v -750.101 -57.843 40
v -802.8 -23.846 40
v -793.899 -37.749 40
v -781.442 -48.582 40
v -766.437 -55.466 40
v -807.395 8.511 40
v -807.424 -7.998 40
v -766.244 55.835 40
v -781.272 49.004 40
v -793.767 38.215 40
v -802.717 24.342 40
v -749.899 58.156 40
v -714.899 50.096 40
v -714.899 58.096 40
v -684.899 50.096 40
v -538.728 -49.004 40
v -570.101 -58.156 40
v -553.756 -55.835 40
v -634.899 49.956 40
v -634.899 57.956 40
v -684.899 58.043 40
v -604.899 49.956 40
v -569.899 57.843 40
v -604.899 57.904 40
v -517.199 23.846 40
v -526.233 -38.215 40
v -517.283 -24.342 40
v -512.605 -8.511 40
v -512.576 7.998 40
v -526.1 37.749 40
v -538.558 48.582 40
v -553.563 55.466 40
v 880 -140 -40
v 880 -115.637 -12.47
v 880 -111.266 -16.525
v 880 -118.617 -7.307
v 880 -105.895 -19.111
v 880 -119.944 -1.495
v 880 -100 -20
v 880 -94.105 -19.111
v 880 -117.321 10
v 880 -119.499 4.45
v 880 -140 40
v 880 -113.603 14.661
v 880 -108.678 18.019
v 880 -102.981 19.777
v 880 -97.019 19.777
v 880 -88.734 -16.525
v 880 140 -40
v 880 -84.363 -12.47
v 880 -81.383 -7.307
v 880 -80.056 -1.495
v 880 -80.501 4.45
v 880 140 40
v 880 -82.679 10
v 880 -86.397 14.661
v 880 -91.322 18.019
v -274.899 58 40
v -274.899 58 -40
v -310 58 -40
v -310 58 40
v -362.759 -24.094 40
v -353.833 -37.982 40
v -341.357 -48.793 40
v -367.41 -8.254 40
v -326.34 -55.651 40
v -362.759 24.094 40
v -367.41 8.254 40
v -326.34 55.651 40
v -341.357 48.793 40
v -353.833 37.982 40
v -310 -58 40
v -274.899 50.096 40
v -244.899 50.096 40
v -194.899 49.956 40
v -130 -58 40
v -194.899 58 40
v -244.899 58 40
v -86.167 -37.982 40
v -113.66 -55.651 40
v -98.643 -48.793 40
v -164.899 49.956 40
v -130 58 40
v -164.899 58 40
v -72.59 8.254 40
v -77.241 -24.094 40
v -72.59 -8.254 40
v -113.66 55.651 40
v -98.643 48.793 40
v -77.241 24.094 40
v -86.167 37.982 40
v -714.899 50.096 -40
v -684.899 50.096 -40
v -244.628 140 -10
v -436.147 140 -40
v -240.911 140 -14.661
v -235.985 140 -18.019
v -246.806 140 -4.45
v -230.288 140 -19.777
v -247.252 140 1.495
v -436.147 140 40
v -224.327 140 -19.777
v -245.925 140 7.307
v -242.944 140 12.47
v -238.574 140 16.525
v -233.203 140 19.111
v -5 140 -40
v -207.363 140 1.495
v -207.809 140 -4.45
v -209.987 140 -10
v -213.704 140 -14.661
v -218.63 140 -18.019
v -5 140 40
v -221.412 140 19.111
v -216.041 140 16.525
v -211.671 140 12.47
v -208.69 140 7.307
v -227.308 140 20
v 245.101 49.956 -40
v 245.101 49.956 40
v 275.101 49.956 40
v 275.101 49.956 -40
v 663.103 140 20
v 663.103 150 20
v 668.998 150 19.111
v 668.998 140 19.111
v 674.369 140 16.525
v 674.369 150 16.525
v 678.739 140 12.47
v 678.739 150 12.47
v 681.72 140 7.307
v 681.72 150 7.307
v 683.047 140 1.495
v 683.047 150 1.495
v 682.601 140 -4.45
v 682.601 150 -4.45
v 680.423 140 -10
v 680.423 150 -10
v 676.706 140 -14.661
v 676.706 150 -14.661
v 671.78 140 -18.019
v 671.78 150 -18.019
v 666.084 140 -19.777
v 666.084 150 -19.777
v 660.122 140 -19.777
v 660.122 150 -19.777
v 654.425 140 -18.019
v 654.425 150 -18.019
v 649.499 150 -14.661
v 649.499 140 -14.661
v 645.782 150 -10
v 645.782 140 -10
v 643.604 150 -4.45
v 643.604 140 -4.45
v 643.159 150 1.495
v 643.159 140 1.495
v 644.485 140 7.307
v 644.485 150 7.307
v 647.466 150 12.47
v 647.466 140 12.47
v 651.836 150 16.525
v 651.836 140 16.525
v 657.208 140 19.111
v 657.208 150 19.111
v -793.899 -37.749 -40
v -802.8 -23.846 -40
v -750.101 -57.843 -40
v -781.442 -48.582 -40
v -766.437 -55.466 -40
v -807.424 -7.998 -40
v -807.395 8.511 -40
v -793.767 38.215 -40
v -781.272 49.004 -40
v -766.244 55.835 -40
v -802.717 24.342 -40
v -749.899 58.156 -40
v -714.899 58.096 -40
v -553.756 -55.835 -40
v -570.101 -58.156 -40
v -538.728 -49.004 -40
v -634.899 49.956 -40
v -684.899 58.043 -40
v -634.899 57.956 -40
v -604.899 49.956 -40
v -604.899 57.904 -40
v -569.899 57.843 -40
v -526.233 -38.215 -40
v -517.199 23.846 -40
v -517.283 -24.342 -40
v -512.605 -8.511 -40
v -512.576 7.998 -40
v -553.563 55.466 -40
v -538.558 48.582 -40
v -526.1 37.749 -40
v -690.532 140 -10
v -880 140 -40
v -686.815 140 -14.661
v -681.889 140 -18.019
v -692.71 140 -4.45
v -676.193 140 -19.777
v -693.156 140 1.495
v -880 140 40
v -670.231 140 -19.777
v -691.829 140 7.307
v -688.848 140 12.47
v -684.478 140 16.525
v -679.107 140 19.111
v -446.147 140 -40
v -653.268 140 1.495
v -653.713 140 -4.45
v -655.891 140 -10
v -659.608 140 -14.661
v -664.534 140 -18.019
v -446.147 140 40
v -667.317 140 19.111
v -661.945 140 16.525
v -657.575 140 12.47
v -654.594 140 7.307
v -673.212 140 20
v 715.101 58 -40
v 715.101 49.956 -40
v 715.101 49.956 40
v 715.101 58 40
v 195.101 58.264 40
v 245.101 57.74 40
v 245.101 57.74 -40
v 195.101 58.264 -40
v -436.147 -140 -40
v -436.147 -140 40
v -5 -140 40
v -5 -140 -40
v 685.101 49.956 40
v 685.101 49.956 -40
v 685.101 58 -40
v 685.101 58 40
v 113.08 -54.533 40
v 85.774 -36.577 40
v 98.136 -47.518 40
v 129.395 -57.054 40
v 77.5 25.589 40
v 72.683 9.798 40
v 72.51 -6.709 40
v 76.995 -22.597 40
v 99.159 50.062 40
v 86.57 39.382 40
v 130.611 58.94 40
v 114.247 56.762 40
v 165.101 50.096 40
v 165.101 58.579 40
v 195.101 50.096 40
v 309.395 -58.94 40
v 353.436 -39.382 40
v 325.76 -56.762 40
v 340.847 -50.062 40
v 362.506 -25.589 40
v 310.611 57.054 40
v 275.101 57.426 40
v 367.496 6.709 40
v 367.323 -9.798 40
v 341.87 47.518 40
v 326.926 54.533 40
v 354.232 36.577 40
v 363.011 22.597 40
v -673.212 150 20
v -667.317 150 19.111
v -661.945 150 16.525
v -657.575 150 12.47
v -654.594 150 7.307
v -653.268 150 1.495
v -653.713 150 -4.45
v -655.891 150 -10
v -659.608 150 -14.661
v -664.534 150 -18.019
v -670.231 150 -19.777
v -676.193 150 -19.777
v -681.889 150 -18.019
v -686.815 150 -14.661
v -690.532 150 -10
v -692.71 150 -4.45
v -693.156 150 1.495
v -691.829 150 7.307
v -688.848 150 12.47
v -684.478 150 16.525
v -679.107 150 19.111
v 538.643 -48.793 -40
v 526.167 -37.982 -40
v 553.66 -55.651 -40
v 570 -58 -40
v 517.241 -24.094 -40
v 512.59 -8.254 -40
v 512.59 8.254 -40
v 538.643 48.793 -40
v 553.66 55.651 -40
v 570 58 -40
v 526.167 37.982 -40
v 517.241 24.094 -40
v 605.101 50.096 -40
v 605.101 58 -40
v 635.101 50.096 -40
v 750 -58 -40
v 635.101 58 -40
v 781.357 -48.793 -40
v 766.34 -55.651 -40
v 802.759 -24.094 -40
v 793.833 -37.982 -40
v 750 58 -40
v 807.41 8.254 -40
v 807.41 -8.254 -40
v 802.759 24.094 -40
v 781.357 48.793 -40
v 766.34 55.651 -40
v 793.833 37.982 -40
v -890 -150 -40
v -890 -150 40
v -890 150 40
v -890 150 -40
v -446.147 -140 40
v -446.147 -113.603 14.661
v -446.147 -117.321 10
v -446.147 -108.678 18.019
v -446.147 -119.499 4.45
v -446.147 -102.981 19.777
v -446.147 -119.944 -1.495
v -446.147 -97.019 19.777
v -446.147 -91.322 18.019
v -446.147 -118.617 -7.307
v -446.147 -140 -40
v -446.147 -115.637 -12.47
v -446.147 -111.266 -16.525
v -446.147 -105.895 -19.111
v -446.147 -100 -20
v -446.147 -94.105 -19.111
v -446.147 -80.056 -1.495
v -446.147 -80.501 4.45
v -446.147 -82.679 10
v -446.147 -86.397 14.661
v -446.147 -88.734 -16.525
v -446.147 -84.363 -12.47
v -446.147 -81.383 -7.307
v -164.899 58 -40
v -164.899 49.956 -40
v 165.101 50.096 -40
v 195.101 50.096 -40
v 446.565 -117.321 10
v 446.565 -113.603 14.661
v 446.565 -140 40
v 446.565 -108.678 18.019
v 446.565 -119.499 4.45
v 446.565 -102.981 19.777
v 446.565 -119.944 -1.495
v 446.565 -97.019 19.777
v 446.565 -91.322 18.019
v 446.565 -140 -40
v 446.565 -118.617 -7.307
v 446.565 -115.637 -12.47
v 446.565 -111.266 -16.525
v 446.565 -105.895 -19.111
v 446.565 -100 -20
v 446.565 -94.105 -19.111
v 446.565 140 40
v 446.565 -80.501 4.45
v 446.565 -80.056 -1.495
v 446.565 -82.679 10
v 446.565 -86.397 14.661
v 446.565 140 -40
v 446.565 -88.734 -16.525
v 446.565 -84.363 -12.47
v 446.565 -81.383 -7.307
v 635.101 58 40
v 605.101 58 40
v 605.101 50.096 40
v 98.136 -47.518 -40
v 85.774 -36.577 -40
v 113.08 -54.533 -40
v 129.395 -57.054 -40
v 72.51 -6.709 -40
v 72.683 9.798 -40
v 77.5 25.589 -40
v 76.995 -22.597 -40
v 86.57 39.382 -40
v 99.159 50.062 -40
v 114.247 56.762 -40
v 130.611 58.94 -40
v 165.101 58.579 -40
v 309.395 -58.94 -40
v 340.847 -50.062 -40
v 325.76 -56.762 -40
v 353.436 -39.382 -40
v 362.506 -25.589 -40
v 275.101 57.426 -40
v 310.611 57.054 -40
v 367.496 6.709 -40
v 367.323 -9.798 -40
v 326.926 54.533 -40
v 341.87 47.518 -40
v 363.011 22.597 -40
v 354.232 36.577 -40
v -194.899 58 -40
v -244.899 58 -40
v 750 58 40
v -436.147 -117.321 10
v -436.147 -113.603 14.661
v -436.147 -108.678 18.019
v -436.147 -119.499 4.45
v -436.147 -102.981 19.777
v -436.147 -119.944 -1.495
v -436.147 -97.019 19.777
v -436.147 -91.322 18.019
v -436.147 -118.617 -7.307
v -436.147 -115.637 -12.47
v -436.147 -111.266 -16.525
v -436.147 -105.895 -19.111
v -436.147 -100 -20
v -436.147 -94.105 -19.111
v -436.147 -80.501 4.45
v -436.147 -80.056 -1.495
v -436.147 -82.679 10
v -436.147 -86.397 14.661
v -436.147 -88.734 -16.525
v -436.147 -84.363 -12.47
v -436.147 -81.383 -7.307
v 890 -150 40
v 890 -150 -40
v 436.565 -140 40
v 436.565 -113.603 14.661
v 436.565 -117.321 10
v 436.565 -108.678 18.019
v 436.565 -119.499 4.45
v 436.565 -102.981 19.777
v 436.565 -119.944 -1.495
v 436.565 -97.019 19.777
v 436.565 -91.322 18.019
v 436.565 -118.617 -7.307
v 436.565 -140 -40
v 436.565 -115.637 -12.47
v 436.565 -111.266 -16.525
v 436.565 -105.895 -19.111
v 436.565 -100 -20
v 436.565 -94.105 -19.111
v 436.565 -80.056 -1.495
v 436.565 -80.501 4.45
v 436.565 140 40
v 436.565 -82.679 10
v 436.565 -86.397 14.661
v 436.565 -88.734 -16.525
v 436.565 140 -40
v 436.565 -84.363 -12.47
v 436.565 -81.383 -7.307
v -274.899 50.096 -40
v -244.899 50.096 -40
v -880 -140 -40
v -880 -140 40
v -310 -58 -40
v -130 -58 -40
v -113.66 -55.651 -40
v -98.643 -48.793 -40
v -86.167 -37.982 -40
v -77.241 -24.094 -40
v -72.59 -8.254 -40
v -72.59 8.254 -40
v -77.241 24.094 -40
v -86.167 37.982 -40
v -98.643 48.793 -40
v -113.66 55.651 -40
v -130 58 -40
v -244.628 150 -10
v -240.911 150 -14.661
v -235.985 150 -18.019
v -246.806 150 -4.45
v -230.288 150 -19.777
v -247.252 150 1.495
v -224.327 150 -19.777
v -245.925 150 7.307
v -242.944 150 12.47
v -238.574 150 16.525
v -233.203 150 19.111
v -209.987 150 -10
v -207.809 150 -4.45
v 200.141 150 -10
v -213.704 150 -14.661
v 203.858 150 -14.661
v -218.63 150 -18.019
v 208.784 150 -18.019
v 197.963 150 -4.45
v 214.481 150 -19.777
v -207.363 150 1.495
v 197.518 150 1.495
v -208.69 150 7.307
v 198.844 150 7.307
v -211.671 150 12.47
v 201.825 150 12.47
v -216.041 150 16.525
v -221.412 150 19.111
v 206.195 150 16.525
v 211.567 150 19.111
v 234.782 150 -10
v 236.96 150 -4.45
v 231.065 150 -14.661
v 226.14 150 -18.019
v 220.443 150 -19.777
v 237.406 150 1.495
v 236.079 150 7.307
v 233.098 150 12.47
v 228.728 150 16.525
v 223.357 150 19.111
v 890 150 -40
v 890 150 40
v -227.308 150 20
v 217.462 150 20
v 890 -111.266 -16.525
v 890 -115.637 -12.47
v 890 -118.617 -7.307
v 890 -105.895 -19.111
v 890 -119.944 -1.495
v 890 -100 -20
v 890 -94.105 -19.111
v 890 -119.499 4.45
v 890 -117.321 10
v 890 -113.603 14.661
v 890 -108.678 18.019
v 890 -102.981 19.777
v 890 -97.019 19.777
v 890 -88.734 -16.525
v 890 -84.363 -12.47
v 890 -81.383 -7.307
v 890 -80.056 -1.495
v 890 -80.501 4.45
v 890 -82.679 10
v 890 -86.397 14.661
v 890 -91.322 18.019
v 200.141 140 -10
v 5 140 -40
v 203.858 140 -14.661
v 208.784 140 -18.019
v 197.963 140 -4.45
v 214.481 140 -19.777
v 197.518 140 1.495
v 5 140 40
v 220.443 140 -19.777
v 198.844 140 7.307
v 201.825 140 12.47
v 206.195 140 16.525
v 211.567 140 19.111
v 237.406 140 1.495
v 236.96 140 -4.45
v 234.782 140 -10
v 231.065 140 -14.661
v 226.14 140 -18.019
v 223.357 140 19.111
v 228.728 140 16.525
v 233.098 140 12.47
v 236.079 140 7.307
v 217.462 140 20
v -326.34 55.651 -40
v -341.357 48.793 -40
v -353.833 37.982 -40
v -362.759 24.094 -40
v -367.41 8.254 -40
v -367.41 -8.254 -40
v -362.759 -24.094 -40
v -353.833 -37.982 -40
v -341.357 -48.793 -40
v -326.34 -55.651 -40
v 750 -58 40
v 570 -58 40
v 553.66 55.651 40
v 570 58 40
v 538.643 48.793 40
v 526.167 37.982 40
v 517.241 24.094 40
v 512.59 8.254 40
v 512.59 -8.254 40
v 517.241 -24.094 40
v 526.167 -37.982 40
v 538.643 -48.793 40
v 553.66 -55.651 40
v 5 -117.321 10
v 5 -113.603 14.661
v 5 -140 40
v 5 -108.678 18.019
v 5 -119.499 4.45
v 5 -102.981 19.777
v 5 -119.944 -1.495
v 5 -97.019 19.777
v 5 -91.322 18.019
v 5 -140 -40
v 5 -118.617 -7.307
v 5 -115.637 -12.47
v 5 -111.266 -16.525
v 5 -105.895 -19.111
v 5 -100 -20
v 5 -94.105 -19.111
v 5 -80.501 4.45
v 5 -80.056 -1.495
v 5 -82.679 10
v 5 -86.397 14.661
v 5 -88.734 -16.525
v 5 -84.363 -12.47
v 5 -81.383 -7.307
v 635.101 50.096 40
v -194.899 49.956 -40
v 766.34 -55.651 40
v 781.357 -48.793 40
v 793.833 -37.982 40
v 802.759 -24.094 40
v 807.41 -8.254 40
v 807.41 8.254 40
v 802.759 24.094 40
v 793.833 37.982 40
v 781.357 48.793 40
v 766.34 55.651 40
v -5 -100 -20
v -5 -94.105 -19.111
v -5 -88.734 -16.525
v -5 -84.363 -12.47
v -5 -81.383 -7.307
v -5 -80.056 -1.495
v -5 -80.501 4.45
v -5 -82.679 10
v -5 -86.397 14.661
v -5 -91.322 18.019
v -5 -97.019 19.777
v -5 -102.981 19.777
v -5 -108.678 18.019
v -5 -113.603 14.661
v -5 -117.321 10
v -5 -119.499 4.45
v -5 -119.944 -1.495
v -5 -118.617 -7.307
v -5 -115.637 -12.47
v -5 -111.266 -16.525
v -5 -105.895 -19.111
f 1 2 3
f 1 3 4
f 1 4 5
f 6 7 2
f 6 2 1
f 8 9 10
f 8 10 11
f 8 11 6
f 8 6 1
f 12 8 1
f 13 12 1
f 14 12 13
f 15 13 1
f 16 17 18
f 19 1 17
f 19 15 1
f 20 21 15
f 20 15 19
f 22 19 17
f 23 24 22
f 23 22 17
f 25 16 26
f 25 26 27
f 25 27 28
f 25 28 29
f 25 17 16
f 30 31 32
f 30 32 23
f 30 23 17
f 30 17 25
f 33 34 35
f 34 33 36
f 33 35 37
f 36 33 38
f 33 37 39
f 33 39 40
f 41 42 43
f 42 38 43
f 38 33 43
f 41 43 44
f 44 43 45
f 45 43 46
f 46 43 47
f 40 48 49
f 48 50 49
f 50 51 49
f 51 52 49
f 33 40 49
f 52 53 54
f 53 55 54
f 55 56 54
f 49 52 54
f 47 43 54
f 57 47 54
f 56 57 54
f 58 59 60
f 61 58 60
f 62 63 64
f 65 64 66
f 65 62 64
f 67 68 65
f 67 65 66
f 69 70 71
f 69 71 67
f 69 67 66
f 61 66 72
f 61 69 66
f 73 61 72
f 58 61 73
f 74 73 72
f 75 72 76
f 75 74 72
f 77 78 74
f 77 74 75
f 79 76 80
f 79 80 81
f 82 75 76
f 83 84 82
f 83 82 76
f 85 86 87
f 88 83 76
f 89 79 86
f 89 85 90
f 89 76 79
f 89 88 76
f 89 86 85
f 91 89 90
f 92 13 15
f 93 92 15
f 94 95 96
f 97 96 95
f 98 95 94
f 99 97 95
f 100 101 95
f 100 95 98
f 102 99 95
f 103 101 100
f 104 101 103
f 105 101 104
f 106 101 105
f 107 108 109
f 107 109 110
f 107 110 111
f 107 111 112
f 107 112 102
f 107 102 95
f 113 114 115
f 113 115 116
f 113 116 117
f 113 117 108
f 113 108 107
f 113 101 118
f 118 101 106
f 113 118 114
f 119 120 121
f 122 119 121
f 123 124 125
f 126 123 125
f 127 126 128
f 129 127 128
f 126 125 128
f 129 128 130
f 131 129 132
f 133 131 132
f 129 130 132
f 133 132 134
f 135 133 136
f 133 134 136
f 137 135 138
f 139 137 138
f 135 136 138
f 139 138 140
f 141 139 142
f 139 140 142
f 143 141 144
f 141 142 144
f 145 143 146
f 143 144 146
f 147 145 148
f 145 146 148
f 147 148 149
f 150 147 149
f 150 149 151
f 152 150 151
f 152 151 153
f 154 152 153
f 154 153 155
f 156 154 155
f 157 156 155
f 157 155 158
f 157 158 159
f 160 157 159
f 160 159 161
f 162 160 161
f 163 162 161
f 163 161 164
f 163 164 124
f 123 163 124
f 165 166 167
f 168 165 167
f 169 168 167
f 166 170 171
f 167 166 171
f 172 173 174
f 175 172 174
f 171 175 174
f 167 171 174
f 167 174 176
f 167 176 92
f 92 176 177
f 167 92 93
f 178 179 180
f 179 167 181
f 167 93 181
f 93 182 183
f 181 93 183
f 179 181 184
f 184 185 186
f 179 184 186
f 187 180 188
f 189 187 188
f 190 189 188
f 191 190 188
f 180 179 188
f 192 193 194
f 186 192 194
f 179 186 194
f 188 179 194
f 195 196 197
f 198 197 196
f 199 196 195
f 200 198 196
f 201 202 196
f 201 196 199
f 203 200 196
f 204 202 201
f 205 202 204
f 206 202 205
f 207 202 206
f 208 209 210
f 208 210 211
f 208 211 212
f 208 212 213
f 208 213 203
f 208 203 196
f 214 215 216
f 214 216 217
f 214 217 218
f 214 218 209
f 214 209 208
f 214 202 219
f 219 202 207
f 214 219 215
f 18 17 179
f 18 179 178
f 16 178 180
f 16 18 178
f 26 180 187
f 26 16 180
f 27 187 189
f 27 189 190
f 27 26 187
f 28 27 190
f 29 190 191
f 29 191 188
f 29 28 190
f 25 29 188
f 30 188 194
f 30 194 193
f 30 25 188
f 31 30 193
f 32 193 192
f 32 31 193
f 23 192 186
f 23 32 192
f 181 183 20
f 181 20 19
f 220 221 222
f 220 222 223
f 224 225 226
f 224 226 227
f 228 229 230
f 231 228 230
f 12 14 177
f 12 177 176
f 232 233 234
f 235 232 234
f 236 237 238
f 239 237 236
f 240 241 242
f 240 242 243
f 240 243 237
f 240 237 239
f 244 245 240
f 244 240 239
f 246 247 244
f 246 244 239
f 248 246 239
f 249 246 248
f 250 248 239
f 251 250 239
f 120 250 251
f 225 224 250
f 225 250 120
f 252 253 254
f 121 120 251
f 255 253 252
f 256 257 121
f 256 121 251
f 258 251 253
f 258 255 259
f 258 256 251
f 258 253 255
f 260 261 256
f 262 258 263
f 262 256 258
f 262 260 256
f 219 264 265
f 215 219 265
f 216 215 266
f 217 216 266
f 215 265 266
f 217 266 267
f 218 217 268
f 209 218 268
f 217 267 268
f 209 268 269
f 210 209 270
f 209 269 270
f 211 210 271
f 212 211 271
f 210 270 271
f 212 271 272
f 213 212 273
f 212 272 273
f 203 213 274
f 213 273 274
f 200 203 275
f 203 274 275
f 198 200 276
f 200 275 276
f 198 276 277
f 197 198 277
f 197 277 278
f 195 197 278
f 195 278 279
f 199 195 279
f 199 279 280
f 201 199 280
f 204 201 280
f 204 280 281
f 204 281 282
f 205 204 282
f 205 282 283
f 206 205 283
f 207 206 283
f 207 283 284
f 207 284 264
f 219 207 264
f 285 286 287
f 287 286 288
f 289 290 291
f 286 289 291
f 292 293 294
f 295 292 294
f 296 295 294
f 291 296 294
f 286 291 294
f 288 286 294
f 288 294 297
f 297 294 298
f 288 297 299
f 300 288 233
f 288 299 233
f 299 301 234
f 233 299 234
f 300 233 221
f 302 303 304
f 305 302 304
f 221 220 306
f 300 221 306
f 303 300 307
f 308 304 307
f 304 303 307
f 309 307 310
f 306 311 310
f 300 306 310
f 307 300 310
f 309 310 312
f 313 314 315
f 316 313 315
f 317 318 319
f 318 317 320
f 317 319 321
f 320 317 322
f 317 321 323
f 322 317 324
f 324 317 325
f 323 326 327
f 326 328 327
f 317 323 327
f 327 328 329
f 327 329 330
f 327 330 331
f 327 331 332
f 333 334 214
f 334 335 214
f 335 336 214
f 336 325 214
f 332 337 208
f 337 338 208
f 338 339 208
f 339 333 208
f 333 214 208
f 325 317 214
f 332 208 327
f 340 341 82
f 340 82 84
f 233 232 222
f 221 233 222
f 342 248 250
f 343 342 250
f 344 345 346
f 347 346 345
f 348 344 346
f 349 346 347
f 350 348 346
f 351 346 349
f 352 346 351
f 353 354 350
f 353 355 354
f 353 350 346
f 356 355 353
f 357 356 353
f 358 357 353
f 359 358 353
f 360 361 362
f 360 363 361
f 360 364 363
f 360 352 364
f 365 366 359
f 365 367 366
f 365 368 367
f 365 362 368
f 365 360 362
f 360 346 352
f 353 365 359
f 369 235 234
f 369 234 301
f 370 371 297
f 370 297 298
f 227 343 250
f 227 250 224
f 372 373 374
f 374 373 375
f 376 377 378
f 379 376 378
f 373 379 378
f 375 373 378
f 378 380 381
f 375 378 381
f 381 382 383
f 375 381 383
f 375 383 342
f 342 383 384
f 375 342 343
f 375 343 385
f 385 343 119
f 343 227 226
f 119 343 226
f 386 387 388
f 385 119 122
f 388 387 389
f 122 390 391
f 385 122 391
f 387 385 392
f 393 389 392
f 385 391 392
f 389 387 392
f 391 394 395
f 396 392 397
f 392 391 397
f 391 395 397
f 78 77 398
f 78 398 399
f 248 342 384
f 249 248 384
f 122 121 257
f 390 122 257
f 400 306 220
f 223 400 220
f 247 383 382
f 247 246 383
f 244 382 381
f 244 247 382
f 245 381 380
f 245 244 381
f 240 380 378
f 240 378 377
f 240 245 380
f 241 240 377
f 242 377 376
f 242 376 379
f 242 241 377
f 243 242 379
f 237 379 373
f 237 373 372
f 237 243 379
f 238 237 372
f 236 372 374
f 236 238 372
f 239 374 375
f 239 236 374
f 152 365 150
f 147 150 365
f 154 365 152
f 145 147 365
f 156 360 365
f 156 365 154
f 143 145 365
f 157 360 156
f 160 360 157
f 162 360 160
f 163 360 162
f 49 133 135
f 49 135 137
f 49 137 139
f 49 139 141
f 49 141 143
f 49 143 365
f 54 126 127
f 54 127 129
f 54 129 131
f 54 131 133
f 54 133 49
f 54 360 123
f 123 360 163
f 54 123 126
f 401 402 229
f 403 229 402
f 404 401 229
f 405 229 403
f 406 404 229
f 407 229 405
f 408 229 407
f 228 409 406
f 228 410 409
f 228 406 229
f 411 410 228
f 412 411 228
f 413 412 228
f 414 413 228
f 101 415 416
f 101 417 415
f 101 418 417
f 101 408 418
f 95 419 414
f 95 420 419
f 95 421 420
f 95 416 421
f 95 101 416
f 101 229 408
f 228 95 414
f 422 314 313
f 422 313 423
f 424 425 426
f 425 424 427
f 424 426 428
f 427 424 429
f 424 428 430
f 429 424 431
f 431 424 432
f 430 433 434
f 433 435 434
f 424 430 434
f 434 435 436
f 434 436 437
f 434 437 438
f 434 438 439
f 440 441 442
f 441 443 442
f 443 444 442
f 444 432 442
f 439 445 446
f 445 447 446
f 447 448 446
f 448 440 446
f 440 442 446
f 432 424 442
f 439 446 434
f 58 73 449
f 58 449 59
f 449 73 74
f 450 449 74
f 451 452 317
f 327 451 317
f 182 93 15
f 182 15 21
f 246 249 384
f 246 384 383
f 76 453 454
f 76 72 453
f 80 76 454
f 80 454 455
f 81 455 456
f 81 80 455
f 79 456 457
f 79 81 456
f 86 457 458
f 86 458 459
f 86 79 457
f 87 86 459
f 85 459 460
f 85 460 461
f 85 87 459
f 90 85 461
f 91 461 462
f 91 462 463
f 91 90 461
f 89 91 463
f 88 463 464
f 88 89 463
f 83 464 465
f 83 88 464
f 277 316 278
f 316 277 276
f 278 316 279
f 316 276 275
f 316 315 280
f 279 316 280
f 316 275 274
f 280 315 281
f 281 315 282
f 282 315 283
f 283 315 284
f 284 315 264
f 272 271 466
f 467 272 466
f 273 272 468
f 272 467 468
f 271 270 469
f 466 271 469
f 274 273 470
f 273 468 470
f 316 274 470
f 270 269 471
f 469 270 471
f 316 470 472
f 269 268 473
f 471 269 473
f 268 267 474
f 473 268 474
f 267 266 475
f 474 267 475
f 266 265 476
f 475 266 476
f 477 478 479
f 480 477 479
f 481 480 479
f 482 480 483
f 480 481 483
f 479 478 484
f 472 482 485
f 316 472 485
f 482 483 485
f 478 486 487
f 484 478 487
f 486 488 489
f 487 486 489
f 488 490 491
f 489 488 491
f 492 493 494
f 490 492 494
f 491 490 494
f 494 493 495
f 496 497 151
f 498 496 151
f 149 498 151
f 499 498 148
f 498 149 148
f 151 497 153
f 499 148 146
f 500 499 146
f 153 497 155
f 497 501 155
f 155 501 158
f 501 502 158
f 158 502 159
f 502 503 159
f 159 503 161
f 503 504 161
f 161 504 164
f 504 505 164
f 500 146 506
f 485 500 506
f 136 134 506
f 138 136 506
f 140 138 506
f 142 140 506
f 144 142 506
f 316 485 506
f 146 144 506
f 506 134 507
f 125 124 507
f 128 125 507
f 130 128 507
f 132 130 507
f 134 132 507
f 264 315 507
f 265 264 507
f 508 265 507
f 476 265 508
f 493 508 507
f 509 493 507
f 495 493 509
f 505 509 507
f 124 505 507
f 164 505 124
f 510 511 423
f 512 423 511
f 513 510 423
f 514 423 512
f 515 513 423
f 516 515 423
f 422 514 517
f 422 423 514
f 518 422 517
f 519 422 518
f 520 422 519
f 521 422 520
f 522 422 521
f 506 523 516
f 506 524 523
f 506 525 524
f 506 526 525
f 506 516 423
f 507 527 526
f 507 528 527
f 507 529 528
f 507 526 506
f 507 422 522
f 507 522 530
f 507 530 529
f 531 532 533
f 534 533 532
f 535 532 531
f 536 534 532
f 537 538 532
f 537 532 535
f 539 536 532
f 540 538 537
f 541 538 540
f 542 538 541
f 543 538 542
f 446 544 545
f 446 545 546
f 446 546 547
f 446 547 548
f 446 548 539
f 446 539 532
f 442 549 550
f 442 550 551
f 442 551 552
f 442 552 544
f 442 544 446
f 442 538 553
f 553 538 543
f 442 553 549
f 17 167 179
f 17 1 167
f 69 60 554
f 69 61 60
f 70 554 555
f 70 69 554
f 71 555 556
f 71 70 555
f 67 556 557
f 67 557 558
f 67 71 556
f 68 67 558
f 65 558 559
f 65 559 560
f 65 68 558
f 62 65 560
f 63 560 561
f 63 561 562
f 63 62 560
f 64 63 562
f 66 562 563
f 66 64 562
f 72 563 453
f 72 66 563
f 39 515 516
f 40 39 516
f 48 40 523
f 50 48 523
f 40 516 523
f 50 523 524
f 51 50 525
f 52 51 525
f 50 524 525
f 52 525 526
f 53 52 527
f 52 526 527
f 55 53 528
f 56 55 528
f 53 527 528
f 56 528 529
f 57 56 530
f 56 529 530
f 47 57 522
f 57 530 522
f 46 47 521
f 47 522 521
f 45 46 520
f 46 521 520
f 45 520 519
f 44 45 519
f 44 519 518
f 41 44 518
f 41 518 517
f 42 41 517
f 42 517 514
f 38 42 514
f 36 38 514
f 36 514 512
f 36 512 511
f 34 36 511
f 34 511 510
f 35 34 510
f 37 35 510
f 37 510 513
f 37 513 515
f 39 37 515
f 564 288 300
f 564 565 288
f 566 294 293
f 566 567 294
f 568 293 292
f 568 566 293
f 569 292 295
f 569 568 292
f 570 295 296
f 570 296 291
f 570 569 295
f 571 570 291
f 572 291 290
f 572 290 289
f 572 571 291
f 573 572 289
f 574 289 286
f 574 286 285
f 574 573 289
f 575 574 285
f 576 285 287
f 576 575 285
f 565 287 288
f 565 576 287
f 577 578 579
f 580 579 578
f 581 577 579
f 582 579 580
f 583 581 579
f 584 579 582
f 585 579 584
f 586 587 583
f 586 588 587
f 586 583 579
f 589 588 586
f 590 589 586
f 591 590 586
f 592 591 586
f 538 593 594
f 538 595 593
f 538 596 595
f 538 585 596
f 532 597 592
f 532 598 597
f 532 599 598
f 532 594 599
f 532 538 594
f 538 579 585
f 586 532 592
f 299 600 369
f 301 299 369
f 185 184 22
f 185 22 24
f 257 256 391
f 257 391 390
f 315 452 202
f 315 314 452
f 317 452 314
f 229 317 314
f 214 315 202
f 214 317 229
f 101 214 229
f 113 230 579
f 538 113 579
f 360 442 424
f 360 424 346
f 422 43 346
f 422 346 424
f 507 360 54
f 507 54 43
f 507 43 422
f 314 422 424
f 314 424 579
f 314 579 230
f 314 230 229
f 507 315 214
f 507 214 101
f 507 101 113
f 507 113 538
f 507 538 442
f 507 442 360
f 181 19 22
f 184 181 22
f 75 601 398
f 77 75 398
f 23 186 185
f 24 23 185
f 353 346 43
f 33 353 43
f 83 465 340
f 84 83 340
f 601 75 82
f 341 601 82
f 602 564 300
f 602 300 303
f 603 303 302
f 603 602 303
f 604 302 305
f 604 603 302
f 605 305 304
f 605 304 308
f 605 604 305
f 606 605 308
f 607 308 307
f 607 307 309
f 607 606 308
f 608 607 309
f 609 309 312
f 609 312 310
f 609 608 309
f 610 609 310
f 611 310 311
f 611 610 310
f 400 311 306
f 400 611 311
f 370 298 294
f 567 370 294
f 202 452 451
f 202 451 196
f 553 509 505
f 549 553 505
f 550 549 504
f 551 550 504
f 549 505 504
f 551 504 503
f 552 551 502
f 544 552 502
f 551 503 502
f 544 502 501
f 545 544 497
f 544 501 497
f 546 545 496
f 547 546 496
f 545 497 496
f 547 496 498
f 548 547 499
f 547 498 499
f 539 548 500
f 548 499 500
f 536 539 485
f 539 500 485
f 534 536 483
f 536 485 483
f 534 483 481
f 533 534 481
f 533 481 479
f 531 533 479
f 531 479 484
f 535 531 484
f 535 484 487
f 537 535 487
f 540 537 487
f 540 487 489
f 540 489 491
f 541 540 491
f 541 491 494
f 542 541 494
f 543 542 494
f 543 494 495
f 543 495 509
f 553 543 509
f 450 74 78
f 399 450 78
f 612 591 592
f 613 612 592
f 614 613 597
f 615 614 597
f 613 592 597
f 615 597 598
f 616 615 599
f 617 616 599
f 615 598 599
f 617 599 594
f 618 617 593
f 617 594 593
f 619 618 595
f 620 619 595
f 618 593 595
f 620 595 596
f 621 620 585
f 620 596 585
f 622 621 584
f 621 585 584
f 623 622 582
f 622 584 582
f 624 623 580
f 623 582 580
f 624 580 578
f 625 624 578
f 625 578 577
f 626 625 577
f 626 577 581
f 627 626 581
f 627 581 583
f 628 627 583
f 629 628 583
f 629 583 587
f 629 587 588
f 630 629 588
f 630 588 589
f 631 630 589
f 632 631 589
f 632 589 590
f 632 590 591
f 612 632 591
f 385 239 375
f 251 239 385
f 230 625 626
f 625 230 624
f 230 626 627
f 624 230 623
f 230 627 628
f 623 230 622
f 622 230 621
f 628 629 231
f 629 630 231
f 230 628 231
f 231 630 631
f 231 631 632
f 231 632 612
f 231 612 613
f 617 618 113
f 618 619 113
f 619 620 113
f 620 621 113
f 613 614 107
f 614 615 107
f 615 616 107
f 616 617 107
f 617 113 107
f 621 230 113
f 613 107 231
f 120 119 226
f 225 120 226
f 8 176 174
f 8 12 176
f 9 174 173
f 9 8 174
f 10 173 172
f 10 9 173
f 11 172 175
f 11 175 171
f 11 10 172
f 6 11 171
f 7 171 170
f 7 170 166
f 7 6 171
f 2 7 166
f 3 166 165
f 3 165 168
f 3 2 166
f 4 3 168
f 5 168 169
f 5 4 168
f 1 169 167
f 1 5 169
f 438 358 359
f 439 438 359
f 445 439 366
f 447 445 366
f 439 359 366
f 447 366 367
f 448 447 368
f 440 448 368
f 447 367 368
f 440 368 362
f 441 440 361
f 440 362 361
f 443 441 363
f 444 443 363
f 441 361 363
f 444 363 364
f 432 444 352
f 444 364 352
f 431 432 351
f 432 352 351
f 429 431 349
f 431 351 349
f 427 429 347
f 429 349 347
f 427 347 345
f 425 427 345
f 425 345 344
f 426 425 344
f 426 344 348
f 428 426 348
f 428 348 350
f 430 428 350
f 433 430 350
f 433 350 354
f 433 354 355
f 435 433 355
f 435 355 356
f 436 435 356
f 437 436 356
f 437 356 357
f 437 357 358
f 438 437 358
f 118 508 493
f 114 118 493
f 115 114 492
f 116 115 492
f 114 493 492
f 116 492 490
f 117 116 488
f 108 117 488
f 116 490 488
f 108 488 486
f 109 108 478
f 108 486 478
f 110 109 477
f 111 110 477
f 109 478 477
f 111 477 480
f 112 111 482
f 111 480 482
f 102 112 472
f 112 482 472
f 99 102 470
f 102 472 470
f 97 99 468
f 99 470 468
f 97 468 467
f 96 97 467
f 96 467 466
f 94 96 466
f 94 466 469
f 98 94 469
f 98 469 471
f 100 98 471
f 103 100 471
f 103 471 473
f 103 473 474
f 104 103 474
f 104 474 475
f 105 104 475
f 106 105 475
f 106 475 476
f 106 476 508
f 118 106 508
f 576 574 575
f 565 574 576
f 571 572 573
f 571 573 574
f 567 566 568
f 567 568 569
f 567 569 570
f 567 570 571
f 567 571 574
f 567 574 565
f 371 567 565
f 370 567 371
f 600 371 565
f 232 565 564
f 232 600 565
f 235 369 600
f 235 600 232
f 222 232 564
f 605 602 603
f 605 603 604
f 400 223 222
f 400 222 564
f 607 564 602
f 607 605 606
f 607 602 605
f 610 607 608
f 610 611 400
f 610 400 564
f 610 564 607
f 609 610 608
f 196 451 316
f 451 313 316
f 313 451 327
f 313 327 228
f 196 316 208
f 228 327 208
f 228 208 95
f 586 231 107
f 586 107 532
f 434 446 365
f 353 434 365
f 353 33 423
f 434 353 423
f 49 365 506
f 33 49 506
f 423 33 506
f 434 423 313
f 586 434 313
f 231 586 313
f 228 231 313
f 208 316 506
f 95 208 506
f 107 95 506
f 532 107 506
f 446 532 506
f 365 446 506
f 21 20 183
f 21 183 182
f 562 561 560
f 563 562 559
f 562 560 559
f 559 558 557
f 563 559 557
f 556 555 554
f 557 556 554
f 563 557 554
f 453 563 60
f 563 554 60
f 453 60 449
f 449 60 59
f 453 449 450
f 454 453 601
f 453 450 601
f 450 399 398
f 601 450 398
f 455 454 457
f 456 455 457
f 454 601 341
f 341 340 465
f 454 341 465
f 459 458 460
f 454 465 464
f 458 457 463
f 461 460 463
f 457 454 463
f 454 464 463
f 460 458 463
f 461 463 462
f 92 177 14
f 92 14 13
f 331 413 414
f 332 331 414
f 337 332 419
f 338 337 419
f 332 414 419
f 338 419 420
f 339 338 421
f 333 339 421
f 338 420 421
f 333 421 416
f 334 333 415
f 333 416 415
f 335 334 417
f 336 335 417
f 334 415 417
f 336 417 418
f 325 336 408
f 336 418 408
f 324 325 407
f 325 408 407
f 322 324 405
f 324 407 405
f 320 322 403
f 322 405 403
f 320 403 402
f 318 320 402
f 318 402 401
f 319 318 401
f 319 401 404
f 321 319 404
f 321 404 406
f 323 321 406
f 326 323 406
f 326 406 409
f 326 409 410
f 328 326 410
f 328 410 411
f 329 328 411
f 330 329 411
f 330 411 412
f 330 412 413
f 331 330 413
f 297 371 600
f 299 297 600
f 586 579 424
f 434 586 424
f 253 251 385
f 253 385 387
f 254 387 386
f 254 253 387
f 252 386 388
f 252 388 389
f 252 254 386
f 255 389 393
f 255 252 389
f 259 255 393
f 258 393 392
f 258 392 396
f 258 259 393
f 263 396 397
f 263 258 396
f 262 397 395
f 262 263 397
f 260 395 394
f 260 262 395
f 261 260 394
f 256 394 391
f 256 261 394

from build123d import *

# Parameters (mm, degrees)
SKETCH1_W               = 1780
SKETCH1_H               = 300
SKETCH1_W_2             = 1760
SKETCH1_H_2             = 280
BOSS_EXTRUDE1_DEPTH     = 40
BOSS_EXTRUDE1_2_DEPTH   = 40
BOSS_EXTRUDE1_3_DEPTH   = 40
BOSS_EXTRUDE1_4_DEPTH   = 40
BOSS_EXTRUDE1_5_DEPTH   = 40
CUT_EXTRUDE1_DEPTH      = 907.090503206
CUT_EXTRUDE1_DEPTH_BACK = 907.090503206
SKETCH2_W               = 30
SKETCH2_H               = 9.489507293
SKETCH2_H_2             = 11.073503662
EXTRUDE_THIN1_START     = -10
SKETCH3_W               = 10
SKETCH3_H               = 80
EXTRUDE_THIN1_DEPTH     = 280
SKETCH4_R               = 20
CUT_EXTRUDE2_DEPTH      = 47
SKETCH6_R               = 20
CUT_EXTRUDE4_DEPTH      = 1437


with BuildPart() as part:
    # Sketch1 → Boss-Extrude1 (new, symmetric)
    with BuildSketch(Plane.XY):
        Rectangle(SKETCH1_W, SKETCH1_H)
        Rectangle(SKETCH1_W_2, SKETCH1_H_2, mode=Mode.SUBTRACT)
    extrude(amount=BOSS_EXTRUDE1_DEPTH, both=True)

    # Sketch3 → Extrude-Thin1 (add)
    with BuildSketch(Plane(origin=(0, 150, 0), x_dir=(1, 0, 0), z_dir=(0, 1, 0)).offset(EXTRUDE_THIN1_START)):
        with Locations((-441.146590851, 0)):
            Rectangle(SKETCH3_W, SKETCH3_H)
        Rectangle(SKETCH3_W, SKETCH3_H)
        with Locations((441.565331283, 0)):
            Rectangle(SKETCH3_W, SKETCH3_H)
    extrude(amount=-EXTRUDE_THIN1_DEPTH)

    # Sketch4 → Cut-Extrude2 (cut)
    with BuildSketch(Plane(origin=(0, 150, 0), x_dir=(1, 0, 0), z_dir=(0, 1, 0))):
        with Locations(Location((663.102774446, 0, 0), (0, 0, 270))):
            Circle(SKETCH4_R)
        with Locations(Location((217.461848741, 0, 0), (0, 0, 270))):
            Circle(SKETCH4_R)
        with Locations(Location((-227.307563803, 0, 0), (0, 0, 270))):
            Circle(SKETCH4_R)
        with Locations(Location((-673.211735279, 0, 0), (0, 0, 270))):
            Circle(SKETCH4_R)
    extrude(amount=-CUT_EXTRUDE2_DEPTH, mode=Mode.SUBTRACT)

    # Sketch6 → Cut-Extrude4 (cut)
    with BuildSketch(Plane(origin=(890, 0, 0), x_dir=(0, 0, -1), z_dir=(1, 0, 0))):
        with Locations((0, -100)):
            Circle(SKETCH6_R)
    extrude(amount=-CUT_EXTRUDE4_DEPTH, mode=Mode.SUBTRACT)


with BuildPart() as body_2:
    # Sketch1 → Boss-Extrude1 2 (new, symmetric)
    with BuildSketch(Plane.XY):
        with BuildLine():
            Line((-750.100799598, -57.843362697), (-570.100799598, -58.156461816))
            ThreePointArc((-570.100799598, -58.156461816), (-512, -0.257436901), (-569.899024915, 57.843362697))
            Line((-569.899024915, 57.843362697), (-749.899024915, 58.156461816))
            ThreePointArc((-749.899024915, 58.156461816), (-807.999824513, 0.257436901), (-750.100799598, -57.843362697))
        make_face()
    extrude(amount=BOSS_EXTRUDE1_2_DEPTH, both=True)


with BuildPart() as body_3:
    # Sketch1 → Boss-Extrude1 3 (new, symmetric)
    with BuildSketch(Plane.XY):
        with BuildLine():
            Line((-310, -58), (-130, -58))
            ThreePointArc((-130, -58), (-72, 0), (-130, 58))
            Line((-130, 58), (-310, 58))
            ThreePointArc((-310, 58), (-368, 0), (-310, -58))
        make_face()
    extrude(amount=BOSS_EXTRUDE1_3_DEPTH, both=True)


with BuildPart() as body_4:
    # Sketch1 → Boss-Extrude1 4 (new, symmetric)
    with BuildSketch(Plane.XY):
        with BuildLine():
            Line((129.395432185, -57.053700429), (309.395432185, -58.939931076))
            ThreePointArc((309.395432185, -58.939931076), (368, -1.550867386), (310.61093631, 57.053700429))
            Line((310.61093631, 57.053700429), (130.61093631, 58.939931076))
            ThreePointArc((130.61093631, 58.939931076), (72.006368495, 1.550867386), (129.395432185, -57.053700429))
        make_face()
    extrude(amount=BOSS_EXTRUDE1_4_DEPTH, both=True)


with BuildPart() as body_5:
    # Sketch1 → Boss-Extrude1 5 (new, symmetric)
    with BuildSketch(Plane.XY):
        with BuildLine():
            Line((570, -58), (750, -58))
            ThreePointArc((750, -58), (808, 0), (750, 58))
            Line((750, 58), (570, 58))
            ThreePointArc((570, 58), (512, 0), (570, -58))
        make_face()
    extrude(amount=BOSS_EXTRUDE1_5_DEPTH, both=True)


with BuildPart() as cut_extrude1_tool:
    # Sketch2 → Cut-Extrude1 (new, two sides: drawn at the far end of the back side and taken through both)
    with BuildSketch(Plane.XY.offset(40).offset(-CUT_EXTRUDE1_DEPTH_BACK)):
        Polygon((-684.899024915, 58.043398245), (-714.899024915, 58.095581432), (-714.899024915, 50.095581432), (-684.899024915, 50.095581432), align=None)
        Polygon((-604.899024915, 57.904243081), (-634.899024915, 57.956426268), (-634.899024915, 49.956426268), (-604.899024915, 49.956426268), align=None)
        with Locations((-179.899024915, 54.701179915)):
            Rectangle(SKETCH2_W, SKETCH2_H)
        with Locations((-259.899024915, 55.632333263)):
            Rectangle(SKETCH2_W, SKETCH2_H_2)
        with Locations((180.100975085, 55.632333263)):
            Rectangle(SKETCH2_W, SKETCH2_H_2)
        with Locations((260.100975085, 54.701179915)):
            Rectangle(SKETCH2_W, SKETCH2_H)
        with Locations((700.100975085, 54.701179915)):
            Rectangle(SKETCH2_W, SKETCH2_H)
        with Locations((620.100975085, 55.632333263)):
            Rectangle(SKETCH2_W, SKETCH2_H_2)
    extrude(amount=CUT_EXTRUDE1_DEPTH + CUT_EXTRUDE1_DEPTH_BACK)


with BuildPart() as body_2_1:
    add(body_2.part)

    # Cut-Extrude1: cut by cut_extrude1_tool
    add(cut_extrude1_tool.part, mode=Mode.SUBTRACT)


with BuildPart() as body_3_1:
    add(body_3.part)

    # Cut-Extrude1: cut by cut_extrude1_tool
    add(cut_extrude1_tool.part, mode=Mode.SUBTRACT)


with BuildPart() as body_4_1:
    add(body_4.part)

    # Cut-Extrude1: cut by cut_extrude1_tool
    add(cut_extrude1_tool.part, mode=Mode.SUBTRACT)


with BuildPart() as body_5_1:
    add(body_5.part)

    # Cut-Extrude1: cut by cut_extrude1_tool
    add(cut_extrude1_tool.part, mode=Mode.SUBTRACT)


solid = Compound([part.part, body_2_1.part, body_3_1.part, body_4_1.part, body_5_1.part])
